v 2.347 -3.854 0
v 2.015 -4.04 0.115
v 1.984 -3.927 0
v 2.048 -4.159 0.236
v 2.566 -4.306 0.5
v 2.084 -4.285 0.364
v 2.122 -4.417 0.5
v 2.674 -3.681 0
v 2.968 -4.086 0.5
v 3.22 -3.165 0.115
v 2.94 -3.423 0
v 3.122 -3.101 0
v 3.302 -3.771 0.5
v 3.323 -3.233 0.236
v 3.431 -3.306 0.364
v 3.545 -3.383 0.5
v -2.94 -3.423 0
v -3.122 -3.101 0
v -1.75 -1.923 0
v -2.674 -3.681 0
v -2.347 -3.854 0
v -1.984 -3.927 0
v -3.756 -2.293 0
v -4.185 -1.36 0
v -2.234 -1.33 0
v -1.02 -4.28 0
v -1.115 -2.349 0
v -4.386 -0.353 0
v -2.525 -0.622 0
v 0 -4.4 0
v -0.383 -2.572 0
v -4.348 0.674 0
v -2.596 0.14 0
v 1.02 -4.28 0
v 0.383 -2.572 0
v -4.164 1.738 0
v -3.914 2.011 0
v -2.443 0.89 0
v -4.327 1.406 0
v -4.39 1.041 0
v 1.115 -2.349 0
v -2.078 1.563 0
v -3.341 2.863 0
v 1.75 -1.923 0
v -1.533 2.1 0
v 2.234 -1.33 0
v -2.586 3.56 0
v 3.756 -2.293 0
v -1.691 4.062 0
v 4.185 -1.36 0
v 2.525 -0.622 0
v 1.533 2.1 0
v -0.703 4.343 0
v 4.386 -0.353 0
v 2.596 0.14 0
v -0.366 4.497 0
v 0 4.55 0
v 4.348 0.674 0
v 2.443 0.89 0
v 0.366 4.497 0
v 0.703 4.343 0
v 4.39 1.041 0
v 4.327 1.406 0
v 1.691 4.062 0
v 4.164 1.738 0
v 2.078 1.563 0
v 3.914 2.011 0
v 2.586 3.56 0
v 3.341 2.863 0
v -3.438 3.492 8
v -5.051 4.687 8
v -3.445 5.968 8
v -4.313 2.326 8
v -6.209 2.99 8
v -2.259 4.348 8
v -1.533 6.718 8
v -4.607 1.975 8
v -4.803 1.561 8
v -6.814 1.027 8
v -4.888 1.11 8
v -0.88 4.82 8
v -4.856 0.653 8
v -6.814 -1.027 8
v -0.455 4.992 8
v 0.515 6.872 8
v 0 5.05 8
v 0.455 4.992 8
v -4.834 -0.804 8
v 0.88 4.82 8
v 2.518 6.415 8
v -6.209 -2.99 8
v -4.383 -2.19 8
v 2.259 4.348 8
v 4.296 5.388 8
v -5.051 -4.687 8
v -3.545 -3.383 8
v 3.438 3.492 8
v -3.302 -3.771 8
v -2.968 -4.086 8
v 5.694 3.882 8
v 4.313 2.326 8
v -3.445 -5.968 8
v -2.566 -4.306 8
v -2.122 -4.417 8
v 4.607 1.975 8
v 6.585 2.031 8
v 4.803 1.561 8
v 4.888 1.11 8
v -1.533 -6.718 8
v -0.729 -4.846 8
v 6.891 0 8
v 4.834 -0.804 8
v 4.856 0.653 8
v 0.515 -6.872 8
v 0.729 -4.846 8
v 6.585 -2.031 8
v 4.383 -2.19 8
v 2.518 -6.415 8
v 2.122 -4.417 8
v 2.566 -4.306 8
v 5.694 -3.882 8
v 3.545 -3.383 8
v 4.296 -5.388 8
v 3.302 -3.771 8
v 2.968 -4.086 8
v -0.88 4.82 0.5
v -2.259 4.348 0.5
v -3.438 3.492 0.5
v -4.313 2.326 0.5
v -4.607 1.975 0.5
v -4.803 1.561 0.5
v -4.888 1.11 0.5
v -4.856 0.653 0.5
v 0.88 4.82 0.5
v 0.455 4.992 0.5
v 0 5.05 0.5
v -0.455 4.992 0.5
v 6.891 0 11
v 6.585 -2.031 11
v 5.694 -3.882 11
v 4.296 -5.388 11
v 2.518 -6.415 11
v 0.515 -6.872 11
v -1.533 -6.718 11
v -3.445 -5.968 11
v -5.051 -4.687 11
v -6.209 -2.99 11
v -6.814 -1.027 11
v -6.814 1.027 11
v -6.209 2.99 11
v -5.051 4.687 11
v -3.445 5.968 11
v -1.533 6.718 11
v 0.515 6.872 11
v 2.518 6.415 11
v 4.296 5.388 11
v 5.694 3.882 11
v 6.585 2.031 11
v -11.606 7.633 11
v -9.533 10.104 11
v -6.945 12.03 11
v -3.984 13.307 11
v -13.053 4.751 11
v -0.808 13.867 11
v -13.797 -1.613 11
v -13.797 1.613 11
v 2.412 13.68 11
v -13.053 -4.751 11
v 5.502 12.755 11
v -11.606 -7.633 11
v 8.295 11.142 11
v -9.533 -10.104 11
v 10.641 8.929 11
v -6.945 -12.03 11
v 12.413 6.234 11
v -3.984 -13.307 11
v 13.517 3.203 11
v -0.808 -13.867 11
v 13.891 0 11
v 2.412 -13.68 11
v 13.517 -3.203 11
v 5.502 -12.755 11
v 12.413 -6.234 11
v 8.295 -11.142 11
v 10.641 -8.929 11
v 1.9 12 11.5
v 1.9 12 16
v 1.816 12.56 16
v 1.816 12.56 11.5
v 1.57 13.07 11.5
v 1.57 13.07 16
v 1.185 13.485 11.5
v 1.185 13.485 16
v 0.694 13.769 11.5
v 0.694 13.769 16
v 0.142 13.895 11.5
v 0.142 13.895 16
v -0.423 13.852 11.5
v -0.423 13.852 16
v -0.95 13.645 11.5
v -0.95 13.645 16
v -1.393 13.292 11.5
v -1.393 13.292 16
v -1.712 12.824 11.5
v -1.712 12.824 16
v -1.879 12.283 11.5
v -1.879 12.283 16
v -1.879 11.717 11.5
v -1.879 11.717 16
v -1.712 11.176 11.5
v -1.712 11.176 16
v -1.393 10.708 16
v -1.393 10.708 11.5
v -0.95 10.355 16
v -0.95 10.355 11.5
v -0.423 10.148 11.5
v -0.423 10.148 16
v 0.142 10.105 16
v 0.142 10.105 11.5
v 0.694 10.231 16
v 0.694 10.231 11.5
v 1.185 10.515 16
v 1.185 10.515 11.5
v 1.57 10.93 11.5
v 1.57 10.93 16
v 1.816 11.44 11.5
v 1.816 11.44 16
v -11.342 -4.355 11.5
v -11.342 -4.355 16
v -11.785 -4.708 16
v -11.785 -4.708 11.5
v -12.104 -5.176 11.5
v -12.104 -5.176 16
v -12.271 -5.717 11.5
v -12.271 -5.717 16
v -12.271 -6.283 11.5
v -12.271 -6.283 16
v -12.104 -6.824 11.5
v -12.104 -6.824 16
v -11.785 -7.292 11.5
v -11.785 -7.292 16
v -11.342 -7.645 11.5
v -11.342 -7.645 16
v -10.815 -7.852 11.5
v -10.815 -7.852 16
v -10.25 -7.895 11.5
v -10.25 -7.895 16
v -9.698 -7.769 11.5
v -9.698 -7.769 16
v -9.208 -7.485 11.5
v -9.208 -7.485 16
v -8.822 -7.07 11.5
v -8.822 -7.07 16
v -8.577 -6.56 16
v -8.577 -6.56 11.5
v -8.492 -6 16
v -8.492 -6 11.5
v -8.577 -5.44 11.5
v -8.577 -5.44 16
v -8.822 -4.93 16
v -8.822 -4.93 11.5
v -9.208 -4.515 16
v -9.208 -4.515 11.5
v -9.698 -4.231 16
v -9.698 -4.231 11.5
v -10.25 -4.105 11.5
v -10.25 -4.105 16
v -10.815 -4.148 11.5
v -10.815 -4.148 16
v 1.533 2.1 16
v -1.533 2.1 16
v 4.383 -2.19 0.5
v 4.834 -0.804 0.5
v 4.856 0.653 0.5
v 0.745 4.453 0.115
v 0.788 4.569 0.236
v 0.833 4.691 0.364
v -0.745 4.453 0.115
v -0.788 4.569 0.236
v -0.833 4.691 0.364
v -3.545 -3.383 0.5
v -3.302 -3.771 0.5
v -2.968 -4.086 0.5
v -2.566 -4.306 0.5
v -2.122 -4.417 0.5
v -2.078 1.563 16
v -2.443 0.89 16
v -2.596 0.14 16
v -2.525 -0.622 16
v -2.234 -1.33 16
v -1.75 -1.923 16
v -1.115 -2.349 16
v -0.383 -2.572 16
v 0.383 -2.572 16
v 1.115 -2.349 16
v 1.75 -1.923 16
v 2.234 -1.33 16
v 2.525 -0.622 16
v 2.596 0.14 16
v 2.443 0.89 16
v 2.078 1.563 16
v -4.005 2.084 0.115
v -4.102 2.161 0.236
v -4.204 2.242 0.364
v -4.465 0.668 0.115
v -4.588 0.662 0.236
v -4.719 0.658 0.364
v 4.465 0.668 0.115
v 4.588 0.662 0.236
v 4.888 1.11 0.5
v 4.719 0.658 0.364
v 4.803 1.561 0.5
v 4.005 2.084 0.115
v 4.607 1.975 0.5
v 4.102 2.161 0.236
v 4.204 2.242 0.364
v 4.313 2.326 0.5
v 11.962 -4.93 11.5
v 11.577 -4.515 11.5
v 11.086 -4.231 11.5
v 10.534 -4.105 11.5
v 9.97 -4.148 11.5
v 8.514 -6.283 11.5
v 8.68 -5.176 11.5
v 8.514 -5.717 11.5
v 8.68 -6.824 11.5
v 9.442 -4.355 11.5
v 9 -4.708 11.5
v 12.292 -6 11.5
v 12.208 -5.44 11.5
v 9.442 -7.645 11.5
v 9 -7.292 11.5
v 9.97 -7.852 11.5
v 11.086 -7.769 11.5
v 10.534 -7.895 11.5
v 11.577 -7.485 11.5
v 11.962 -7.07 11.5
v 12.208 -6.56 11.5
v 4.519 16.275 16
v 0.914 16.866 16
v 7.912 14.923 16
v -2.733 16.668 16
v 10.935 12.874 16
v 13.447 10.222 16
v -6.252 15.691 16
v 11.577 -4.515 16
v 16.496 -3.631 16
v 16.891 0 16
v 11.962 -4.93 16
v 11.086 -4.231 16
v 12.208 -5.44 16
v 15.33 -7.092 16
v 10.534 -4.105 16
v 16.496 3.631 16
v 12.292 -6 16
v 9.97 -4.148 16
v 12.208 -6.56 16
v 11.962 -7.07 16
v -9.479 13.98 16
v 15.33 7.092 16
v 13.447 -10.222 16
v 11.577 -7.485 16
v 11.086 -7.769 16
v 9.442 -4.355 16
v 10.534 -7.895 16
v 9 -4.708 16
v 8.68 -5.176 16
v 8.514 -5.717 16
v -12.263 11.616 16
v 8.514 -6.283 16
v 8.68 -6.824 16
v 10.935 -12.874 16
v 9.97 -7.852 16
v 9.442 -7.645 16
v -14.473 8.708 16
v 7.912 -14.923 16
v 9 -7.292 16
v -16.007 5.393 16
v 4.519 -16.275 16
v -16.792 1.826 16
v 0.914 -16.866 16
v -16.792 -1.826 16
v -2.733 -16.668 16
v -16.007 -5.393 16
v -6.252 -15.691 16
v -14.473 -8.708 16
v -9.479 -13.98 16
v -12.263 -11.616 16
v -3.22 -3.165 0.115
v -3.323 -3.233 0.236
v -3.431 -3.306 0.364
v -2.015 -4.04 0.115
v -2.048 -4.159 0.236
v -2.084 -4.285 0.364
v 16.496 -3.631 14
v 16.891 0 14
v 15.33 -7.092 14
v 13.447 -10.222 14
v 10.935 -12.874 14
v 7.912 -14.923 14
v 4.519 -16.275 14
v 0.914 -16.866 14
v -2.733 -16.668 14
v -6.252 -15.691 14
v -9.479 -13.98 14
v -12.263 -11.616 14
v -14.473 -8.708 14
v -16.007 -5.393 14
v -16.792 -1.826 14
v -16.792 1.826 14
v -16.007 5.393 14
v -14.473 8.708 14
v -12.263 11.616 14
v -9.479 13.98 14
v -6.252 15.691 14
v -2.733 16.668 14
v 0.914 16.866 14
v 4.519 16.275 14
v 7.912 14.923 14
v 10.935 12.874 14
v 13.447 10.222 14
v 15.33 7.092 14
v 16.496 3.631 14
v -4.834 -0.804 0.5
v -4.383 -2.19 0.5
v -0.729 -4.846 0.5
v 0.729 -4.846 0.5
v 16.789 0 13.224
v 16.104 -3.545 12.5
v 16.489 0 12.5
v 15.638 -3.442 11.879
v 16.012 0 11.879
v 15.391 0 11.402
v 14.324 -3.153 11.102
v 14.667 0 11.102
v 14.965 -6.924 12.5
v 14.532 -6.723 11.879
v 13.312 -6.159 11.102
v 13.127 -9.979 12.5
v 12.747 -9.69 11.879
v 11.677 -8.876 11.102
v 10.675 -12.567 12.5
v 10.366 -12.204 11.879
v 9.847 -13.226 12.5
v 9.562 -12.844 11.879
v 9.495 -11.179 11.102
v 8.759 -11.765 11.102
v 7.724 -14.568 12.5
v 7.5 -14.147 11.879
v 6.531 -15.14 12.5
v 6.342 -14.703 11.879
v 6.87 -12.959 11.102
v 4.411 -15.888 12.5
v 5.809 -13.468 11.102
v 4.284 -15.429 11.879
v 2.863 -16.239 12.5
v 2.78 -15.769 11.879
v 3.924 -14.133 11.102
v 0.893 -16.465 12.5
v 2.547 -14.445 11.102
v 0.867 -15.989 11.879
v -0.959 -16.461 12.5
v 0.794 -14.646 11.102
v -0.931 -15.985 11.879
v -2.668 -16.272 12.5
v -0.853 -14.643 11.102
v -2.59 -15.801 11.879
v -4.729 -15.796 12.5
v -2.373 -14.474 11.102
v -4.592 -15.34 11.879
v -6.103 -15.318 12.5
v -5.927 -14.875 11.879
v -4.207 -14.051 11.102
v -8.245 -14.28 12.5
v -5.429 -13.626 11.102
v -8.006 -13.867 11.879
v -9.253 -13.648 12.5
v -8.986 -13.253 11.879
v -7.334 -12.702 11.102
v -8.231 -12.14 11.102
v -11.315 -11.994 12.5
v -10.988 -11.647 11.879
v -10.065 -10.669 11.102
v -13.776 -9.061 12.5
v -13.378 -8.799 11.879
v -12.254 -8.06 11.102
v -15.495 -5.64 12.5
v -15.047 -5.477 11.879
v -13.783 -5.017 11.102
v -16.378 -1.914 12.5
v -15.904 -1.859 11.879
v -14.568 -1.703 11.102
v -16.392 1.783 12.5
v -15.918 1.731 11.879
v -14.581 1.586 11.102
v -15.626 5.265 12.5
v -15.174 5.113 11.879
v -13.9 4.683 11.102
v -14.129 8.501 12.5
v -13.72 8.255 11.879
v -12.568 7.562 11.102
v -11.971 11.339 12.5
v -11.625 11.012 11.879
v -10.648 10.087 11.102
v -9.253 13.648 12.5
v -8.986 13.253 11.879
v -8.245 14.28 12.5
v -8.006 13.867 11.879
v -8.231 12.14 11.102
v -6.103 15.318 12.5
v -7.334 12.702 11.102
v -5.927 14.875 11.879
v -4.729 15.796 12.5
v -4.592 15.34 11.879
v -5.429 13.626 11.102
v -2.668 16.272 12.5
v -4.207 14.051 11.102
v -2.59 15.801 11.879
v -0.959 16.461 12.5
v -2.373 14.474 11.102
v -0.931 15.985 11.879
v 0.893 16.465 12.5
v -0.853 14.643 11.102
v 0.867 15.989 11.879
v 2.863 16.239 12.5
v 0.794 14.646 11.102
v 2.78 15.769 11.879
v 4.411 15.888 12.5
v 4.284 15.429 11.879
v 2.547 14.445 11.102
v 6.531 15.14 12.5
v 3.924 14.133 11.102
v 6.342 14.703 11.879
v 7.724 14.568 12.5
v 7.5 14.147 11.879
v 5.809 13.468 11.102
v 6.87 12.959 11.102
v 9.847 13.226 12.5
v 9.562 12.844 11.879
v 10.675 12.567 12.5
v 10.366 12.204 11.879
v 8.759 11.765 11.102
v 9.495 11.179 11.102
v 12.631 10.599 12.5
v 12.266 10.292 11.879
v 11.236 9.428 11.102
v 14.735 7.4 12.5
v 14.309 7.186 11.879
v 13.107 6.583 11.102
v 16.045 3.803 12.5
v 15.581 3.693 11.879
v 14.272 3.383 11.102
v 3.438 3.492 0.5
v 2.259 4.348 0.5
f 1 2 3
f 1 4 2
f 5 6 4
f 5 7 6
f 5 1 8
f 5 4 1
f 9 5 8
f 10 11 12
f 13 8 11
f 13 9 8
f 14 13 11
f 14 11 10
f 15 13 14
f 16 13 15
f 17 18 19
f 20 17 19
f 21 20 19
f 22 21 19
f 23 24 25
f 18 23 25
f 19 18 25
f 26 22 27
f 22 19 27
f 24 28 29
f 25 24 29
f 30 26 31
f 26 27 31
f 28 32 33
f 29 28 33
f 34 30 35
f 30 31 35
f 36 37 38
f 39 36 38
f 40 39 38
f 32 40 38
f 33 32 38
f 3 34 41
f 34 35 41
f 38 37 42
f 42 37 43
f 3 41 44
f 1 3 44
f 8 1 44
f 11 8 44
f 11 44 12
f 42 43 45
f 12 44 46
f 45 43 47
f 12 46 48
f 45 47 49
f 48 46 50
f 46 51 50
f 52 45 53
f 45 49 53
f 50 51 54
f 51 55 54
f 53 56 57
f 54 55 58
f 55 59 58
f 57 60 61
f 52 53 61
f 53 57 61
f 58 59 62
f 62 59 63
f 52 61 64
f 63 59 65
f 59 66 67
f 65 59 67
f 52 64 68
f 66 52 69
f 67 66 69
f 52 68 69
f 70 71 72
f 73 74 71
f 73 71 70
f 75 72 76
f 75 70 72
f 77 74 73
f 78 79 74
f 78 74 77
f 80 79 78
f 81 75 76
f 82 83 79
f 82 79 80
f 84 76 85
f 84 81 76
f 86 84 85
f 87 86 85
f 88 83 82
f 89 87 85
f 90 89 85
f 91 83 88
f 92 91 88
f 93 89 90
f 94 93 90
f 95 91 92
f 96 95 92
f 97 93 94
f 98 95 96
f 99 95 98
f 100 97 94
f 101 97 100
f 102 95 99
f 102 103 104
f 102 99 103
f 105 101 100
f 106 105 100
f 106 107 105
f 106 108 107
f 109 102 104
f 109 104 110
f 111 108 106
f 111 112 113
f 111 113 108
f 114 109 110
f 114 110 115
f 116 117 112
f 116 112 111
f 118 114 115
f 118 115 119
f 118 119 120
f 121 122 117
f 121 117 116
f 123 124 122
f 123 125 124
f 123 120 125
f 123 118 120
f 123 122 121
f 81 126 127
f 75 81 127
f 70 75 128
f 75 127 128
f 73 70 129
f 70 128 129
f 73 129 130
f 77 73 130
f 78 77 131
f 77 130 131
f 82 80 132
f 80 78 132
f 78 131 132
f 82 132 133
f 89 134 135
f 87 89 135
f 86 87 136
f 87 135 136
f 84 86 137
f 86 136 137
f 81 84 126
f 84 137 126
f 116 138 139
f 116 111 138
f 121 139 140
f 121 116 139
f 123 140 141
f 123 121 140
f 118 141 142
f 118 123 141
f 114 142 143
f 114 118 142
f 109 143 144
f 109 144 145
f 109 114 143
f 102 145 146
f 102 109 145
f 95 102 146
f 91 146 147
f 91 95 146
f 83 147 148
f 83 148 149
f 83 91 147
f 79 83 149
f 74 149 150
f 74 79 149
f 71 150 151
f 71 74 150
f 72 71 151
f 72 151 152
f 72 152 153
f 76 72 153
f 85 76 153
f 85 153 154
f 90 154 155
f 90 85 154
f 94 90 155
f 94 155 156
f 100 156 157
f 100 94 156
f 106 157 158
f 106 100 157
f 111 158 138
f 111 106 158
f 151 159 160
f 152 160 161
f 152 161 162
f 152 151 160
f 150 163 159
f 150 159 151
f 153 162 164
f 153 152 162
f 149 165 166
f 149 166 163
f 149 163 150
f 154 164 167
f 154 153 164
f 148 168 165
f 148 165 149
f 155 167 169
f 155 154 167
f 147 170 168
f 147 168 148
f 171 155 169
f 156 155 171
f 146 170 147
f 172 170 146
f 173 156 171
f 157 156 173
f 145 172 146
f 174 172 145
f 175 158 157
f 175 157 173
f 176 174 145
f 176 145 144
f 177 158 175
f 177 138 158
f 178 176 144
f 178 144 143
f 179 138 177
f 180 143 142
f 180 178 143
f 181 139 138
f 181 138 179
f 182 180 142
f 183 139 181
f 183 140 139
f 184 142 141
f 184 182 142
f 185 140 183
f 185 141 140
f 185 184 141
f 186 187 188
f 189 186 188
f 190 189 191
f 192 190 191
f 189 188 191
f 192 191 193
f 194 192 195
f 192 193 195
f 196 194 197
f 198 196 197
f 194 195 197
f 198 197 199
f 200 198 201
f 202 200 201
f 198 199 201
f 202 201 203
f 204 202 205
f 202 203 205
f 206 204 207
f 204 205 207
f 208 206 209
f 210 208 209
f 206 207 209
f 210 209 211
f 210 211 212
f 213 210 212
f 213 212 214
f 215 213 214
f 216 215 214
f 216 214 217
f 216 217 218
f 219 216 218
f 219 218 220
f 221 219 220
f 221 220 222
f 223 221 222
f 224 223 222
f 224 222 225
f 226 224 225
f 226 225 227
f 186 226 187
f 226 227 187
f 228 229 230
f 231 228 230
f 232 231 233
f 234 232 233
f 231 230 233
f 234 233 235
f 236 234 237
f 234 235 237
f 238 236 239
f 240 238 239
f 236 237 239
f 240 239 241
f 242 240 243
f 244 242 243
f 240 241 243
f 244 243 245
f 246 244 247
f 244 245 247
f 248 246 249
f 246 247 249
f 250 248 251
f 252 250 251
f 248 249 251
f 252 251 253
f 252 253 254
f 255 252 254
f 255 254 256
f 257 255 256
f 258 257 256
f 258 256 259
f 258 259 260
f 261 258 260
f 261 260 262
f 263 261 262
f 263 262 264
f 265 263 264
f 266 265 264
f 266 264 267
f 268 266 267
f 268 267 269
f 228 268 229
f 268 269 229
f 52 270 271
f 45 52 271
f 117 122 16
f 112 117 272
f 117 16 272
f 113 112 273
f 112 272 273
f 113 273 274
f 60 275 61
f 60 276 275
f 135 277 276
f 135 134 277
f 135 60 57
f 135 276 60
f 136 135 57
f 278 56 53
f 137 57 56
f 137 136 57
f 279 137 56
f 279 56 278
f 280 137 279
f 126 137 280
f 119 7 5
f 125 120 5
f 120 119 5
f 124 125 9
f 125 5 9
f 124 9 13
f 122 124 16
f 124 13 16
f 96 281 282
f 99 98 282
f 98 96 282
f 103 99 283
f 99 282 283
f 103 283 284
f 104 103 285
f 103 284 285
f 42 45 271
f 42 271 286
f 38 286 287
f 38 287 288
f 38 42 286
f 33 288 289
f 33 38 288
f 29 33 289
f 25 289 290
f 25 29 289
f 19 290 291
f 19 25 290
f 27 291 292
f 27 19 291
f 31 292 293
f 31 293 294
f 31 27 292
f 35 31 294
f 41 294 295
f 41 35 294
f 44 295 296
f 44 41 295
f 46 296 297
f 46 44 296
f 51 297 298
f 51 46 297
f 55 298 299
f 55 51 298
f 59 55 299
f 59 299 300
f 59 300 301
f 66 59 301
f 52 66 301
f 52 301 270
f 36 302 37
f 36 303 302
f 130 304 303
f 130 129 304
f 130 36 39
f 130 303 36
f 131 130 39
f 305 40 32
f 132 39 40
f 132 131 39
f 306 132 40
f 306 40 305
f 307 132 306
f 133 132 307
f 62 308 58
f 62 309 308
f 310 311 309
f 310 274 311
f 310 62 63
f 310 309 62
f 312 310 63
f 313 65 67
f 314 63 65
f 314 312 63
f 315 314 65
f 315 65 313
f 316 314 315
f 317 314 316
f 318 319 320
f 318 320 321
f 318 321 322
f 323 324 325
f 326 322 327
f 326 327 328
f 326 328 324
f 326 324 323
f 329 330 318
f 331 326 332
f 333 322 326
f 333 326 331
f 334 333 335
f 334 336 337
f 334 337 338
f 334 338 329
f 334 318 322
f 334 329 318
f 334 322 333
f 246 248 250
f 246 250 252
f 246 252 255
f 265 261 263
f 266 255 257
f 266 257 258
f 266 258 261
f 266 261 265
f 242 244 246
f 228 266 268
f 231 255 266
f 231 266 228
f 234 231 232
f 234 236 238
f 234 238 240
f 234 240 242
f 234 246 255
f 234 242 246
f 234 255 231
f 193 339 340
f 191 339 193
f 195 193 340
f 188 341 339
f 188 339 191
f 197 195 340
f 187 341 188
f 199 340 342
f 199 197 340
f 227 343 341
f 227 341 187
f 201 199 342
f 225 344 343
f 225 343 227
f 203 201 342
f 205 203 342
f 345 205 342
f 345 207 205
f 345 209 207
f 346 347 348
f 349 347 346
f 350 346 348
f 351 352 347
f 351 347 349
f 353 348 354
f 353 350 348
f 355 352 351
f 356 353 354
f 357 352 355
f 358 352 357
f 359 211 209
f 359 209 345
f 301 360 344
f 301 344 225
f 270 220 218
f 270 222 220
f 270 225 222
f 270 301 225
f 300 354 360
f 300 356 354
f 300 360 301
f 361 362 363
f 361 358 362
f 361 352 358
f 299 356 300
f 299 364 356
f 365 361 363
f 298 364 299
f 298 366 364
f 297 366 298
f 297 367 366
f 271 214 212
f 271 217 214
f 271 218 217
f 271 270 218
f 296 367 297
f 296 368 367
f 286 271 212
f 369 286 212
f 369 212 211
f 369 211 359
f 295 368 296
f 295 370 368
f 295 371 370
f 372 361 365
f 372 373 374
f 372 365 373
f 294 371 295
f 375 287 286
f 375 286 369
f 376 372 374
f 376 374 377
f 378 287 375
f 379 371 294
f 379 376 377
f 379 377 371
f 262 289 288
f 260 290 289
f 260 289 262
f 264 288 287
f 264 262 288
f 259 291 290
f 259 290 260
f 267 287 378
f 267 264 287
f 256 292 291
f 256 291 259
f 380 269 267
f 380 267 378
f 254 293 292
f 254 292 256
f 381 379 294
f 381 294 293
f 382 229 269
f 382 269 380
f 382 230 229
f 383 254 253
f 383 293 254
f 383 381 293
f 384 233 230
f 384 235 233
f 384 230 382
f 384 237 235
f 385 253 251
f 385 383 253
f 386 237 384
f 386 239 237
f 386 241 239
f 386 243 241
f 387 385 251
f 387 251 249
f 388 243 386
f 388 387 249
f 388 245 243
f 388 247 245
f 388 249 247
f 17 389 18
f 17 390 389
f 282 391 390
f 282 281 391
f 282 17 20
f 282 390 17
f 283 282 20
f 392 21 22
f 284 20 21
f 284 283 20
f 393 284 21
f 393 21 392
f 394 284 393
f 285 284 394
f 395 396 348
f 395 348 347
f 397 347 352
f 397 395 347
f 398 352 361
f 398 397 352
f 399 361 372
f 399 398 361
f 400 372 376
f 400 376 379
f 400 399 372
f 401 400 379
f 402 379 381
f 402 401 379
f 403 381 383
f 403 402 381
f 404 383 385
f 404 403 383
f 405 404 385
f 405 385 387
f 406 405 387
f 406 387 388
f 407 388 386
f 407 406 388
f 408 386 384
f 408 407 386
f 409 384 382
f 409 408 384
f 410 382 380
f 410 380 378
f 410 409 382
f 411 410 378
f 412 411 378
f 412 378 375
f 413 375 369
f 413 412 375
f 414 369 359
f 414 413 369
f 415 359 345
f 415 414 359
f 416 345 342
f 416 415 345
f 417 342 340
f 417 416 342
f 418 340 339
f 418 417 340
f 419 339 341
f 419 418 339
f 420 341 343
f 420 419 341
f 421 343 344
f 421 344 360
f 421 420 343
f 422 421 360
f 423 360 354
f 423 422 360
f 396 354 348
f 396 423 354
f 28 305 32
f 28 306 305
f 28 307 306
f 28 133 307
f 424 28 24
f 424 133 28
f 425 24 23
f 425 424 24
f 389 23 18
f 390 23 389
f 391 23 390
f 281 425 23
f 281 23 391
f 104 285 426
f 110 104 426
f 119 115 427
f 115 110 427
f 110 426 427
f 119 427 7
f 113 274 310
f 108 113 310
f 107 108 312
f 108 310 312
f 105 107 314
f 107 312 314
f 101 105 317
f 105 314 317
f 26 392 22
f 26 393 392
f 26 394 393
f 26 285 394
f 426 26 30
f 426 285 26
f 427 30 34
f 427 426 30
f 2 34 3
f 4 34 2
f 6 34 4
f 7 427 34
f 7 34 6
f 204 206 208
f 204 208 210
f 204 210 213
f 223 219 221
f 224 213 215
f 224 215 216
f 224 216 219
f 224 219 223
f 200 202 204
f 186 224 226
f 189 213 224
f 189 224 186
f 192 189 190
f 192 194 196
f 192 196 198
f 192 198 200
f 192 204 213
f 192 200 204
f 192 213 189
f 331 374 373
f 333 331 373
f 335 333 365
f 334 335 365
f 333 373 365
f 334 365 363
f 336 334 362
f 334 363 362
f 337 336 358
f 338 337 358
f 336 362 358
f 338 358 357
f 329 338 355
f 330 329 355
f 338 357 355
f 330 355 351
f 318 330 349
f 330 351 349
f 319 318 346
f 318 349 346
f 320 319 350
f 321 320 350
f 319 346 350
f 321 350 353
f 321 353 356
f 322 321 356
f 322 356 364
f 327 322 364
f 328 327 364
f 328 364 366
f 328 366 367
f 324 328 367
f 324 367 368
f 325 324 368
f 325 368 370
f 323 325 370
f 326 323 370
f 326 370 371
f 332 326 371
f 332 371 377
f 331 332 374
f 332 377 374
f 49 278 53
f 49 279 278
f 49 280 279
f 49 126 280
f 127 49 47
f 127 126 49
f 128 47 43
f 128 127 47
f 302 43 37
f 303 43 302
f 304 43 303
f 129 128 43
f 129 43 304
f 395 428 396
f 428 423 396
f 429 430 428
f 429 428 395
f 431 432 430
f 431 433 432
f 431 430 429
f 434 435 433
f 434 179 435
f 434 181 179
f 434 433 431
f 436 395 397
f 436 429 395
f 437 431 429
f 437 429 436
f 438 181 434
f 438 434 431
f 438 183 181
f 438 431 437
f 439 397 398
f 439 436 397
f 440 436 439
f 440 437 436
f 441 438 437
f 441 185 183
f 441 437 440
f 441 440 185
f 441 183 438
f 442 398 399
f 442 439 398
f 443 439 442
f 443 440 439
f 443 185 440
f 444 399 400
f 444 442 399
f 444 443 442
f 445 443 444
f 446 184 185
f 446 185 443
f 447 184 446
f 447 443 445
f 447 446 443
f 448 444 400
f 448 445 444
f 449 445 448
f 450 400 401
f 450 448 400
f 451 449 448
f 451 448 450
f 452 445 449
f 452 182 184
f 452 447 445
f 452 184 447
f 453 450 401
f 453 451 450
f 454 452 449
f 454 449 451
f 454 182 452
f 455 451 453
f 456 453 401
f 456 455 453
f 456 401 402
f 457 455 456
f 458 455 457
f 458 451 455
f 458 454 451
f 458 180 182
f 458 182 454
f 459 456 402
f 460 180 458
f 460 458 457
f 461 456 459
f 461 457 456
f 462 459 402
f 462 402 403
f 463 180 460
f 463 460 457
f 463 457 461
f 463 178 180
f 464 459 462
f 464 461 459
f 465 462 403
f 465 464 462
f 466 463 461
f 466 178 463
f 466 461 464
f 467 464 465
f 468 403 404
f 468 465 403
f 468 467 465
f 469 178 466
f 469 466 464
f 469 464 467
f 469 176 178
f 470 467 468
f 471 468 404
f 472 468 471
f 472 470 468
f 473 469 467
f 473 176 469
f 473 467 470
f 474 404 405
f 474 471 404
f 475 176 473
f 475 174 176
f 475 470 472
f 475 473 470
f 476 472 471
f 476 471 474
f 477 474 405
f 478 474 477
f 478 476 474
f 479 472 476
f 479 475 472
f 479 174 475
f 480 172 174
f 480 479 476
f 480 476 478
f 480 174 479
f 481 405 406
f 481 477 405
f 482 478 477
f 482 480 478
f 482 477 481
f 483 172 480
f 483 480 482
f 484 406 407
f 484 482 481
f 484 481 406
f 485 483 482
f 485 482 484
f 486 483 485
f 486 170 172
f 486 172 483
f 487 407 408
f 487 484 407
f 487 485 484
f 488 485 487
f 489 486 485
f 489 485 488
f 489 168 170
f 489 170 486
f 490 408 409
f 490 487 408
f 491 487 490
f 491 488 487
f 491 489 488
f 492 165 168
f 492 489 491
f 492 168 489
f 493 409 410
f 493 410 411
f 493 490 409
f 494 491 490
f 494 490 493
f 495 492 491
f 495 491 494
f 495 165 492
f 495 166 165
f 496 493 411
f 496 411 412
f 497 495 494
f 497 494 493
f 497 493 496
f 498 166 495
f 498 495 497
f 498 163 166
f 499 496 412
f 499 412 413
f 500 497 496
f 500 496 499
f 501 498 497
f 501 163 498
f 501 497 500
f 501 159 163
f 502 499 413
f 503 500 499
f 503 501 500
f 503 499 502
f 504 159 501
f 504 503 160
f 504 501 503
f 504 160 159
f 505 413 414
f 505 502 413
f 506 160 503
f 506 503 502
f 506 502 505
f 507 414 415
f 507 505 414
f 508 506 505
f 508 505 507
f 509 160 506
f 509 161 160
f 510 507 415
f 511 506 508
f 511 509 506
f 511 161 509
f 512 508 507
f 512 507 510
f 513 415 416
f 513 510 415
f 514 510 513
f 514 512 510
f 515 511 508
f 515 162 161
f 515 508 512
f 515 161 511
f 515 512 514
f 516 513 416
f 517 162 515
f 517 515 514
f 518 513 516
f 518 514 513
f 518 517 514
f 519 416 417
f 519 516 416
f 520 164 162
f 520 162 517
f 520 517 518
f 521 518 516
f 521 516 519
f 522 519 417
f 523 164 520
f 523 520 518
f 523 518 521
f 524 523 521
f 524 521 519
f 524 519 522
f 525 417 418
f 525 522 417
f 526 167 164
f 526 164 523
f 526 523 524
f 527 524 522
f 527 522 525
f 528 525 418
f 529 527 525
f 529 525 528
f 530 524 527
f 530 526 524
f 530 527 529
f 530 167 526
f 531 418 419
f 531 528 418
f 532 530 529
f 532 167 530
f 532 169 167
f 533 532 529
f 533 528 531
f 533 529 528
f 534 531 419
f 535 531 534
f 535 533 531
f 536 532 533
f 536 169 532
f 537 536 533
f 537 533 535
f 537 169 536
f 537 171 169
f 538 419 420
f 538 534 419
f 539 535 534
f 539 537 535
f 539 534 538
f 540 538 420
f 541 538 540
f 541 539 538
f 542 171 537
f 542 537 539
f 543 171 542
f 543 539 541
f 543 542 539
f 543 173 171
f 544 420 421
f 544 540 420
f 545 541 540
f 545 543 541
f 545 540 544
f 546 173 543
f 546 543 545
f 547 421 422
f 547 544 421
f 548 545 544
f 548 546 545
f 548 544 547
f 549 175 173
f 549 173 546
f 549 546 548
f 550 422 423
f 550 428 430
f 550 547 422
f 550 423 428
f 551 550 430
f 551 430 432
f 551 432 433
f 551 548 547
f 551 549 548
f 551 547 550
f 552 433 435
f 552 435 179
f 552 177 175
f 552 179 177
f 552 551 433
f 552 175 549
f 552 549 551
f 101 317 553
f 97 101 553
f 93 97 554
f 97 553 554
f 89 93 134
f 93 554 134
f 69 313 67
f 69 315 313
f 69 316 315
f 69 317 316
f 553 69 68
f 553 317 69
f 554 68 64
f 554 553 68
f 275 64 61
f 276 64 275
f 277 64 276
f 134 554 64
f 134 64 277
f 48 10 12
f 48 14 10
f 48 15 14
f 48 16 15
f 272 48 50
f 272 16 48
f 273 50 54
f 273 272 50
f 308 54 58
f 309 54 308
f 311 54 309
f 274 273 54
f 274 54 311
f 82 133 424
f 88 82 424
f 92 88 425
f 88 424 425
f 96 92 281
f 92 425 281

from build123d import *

# Parameters (mm, degrees)
AUFSATZ_LINEAR_AUSTRAGEN1_DEPTH = 16
SCHNITT_LINEAR_AUSTRAGEN1_DEPTH = 16
VERRUNDUNG3_R                   = 3
SKIZZE6_R                       = 1.9
SCHNITT_LINEAR_AUSTRAGEN2_DEPTH = 4.5
KREISMUSTER1_COUNT              = 3
FASE1_SIZE                      = 0.5


with BuildPart() as part:
    # Skizze3 → Aufsatz-Linear austragen1 (new body)
    with BuildSketch(Plane.XY):
        with BuildLine():
            ThreePointArc((3.545052466, -3.382691682), (4.66017693, -1.514183272), (4.856303974, 0.652925499))
            ThreePointArc((4.856303974, 0.652925499), (4.802835407, 1.560535822), (4.312612425, 2.326236032))
            ThreePointArc((4.312612425, 2.326236032), (2.880147736, 3.964183272), (0.879711407, 4.820384615))
            ThreePointArc((0.879711407, 4.820384615), (0, 5.05), (-0.879711407, 4.820384615))
            ThreePointArc((-0.879711407, 4.820384615), (-2.880147736, 3.964183272), (-4.312612425, 2.326236032))
            ThreePointArc((-4.312612425, 2.326236032), (-4.802835407, 1.560535822), (-4.856303974, 0.652925499))
            ThreePointArc((-4.856303974, 0.652925499), (-4.66017693, -1.514183272), (-3.545052466, -3.382691682))
            ThreePointArc((-3.545052466, -3.382691682), (-2.968315524, -4.085535822), (-2.121649509, -4.416854465))
            ThreePointArc((-2.121649509, -4.416854465), (0, -4.9), (2.121649509, -4.416854465))
            ThreePointArc((2.121649509, -4.416854465), (2.968315524, -4.085535822), (3.545052466, -3.382691682))
        make_face()
    extrude(amount=AUFSATZ_LINEAR_AUSTRAGEN1_DEPTH)

    # Skizze4 → Schnitt-Linear austragen1 (cut)
    with BuildSketch(Plane(origin=(0, 0, 0), x_dir=(-1, 0, 0), z_dir=(0, 0, -1))):
        with BuildLine():
            Line((-1.532970972, 2.1), (1.532970972, 2.1))
            ThreePointArc((1.532970972, 2.1), (0, -2.6), (-1.532970972, 2.1))
        make_face()
    extrude(amount=-SCHNITT_LINEAR_AUSTRAGEN1_DEPTH, mode=Mode.SUBTRACT)

    # Skizze5 → Rotation1 (revolve)
    with BuildSketch(Plane(origin=(0, 0, 0), x_dir=(1, 0, 0), z_dir=(0, 1, 0)), mode=Mode.PRIVATE) as rotation1_sk:
        Polygon((-4.890933678, -16), (-16.890933678, -16), (-16.890933678, -11), (-6.890933678, -11), (-6.890933678, -8), (-4.890933678, -8), align=None)
    revolve(rotation1_sk.sketch.rotate(Axis((0, 0, 16), (0, 0, -1)), 180), axis=Axis((0, 0, 16), (0, 0, -1)))

    # Verrundung3
    verrundung3_edges = [part.edges().sort_by_distance(p)[0] for p in [
        (-16.890933678, 0, 11),
    ]]
    fillet(verrundung3_edges, radius=VERRUNDUNG3_R)

    # Skizze6 → Schnitt-Linear austragen2 (cut)
    with BuildSketch(Plane.XY.offset(16)):
        with Locations((0, 12)):
            Circle(SKIZZE6_R)
    schnitt_linear_austragen2 = extrude(amount=-SCHNITT_LINEAR_AUSTRAGEN2_DEPTH, mode=Mode.SUBTRACT)

    # Kreismuster1: Schnitt-Linear austragen2 ×3 about axis
    kreismuster1_axis = Axis((0, 0, 0), (0, 0, 1))
    for i in range(1, KREISMUSTER1_COUNT):
        add(schnitt_linear_austragen2.rotate(kreismuster1_axis, i * 360 / KREISMUSTER1_COUNT), mode=Mode.SUBTRACT)

    # Fase1
    fase1_edges = [part.edges().sort_by_distance(p)[0] for p in [
        (0, 5.05, 0),
        (2.880147736, 3.964183272, 0),
        (4.802835407, 1.560535822, 0),
        (4.66017693, -1.514183272, 0),
        (2.968315524, -4.085535822, 0),
        (0, -4.9, 0),
        (-2.968315524, -4.085535822, 0),
        (-4.66017693, -1.514183272, 0),
        (-4.802835407, 1.560535822, 0),
        (-2.880147736, 3.964183272, 0),
    ]]
    chamfer(fase1_edges, length=FASE1_SIZE)


solid = part.part
